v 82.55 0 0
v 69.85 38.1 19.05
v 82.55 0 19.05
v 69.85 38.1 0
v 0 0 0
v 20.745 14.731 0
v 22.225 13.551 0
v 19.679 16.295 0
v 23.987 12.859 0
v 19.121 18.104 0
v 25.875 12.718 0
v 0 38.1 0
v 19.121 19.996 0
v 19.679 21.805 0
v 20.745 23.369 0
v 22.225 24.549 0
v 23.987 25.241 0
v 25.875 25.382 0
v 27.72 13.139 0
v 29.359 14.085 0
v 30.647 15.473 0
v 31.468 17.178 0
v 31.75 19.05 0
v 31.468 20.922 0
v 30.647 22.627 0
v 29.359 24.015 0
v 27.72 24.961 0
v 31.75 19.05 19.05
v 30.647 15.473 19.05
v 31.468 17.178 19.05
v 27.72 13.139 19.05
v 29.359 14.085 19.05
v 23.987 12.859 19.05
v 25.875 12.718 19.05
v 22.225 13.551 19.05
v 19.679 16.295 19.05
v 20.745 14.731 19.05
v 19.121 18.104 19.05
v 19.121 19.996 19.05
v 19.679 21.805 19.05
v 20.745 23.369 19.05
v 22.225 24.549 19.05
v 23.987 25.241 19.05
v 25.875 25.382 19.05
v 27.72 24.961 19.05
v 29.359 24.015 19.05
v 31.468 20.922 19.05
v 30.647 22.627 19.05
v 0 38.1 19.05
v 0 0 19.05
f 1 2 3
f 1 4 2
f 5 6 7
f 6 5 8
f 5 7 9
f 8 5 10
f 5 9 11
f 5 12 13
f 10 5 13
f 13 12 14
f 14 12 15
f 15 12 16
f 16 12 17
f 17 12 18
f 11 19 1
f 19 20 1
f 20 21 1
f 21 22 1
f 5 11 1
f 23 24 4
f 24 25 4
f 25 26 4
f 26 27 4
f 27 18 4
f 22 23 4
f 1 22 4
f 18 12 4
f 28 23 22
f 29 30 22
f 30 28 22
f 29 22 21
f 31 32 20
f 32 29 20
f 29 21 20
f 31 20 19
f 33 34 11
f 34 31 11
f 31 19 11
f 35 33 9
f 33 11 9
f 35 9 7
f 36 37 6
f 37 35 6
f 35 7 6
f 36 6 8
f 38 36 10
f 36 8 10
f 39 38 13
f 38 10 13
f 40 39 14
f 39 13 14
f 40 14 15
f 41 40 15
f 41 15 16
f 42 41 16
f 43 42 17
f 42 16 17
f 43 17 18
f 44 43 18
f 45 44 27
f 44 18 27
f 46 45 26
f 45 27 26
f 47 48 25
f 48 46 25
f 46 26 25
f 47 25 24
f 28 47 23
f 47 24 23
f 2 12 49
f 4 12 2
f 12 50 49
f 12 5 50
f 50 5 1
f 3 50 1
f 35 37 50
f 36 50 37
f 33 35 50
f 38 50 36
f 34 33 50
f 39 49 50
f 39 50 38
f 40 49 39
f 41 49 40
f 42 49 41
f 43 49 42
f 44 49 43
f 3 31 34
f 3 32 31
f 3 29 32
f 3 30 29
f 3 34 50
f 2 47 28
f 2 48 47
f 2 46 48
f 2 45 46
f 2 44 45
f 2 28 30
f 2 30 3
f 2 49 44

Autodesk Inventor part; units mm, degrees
ref_plane "YZ Plane" through (0, 0, 0) normal (1, 0, 0) x (0, 1, 0)
ref_plane "XZ Plane" through (0, 0, 0) normal (0, 1, 0) x (-1, 0, 0)
ref_plane "XY Plane" through (0, 0, 0) normal (0, 0, 1) x (1, 0, 0)
sketch "Sketch1" plane through (0, 0, 0) normal (0, 0, 1) x (1, 0, 0)
  line L0 (0, 0) -> (82.55, 0)
  line L1 (0, 0) -> (0, 38.1)
  line L2 (0, 38.1) -> (69.85, 38.1)
  line L3 (69.85, 38.1) -> (82.55, 0)
  circle A0 centre (25.4, 19.05) radius 6.35
  dimension "d0" = 82.55
  dimension "d1" = 38.1
  dimension "d2" = 69.85
  dimension "d3" = 12.7
  dimension "d4" = 19.05
  dimension "d5" = 25.4
extrude "Extrusion1" add sketch "Sketch1" along normal blind 19.05
properties part number "final orthograph"
